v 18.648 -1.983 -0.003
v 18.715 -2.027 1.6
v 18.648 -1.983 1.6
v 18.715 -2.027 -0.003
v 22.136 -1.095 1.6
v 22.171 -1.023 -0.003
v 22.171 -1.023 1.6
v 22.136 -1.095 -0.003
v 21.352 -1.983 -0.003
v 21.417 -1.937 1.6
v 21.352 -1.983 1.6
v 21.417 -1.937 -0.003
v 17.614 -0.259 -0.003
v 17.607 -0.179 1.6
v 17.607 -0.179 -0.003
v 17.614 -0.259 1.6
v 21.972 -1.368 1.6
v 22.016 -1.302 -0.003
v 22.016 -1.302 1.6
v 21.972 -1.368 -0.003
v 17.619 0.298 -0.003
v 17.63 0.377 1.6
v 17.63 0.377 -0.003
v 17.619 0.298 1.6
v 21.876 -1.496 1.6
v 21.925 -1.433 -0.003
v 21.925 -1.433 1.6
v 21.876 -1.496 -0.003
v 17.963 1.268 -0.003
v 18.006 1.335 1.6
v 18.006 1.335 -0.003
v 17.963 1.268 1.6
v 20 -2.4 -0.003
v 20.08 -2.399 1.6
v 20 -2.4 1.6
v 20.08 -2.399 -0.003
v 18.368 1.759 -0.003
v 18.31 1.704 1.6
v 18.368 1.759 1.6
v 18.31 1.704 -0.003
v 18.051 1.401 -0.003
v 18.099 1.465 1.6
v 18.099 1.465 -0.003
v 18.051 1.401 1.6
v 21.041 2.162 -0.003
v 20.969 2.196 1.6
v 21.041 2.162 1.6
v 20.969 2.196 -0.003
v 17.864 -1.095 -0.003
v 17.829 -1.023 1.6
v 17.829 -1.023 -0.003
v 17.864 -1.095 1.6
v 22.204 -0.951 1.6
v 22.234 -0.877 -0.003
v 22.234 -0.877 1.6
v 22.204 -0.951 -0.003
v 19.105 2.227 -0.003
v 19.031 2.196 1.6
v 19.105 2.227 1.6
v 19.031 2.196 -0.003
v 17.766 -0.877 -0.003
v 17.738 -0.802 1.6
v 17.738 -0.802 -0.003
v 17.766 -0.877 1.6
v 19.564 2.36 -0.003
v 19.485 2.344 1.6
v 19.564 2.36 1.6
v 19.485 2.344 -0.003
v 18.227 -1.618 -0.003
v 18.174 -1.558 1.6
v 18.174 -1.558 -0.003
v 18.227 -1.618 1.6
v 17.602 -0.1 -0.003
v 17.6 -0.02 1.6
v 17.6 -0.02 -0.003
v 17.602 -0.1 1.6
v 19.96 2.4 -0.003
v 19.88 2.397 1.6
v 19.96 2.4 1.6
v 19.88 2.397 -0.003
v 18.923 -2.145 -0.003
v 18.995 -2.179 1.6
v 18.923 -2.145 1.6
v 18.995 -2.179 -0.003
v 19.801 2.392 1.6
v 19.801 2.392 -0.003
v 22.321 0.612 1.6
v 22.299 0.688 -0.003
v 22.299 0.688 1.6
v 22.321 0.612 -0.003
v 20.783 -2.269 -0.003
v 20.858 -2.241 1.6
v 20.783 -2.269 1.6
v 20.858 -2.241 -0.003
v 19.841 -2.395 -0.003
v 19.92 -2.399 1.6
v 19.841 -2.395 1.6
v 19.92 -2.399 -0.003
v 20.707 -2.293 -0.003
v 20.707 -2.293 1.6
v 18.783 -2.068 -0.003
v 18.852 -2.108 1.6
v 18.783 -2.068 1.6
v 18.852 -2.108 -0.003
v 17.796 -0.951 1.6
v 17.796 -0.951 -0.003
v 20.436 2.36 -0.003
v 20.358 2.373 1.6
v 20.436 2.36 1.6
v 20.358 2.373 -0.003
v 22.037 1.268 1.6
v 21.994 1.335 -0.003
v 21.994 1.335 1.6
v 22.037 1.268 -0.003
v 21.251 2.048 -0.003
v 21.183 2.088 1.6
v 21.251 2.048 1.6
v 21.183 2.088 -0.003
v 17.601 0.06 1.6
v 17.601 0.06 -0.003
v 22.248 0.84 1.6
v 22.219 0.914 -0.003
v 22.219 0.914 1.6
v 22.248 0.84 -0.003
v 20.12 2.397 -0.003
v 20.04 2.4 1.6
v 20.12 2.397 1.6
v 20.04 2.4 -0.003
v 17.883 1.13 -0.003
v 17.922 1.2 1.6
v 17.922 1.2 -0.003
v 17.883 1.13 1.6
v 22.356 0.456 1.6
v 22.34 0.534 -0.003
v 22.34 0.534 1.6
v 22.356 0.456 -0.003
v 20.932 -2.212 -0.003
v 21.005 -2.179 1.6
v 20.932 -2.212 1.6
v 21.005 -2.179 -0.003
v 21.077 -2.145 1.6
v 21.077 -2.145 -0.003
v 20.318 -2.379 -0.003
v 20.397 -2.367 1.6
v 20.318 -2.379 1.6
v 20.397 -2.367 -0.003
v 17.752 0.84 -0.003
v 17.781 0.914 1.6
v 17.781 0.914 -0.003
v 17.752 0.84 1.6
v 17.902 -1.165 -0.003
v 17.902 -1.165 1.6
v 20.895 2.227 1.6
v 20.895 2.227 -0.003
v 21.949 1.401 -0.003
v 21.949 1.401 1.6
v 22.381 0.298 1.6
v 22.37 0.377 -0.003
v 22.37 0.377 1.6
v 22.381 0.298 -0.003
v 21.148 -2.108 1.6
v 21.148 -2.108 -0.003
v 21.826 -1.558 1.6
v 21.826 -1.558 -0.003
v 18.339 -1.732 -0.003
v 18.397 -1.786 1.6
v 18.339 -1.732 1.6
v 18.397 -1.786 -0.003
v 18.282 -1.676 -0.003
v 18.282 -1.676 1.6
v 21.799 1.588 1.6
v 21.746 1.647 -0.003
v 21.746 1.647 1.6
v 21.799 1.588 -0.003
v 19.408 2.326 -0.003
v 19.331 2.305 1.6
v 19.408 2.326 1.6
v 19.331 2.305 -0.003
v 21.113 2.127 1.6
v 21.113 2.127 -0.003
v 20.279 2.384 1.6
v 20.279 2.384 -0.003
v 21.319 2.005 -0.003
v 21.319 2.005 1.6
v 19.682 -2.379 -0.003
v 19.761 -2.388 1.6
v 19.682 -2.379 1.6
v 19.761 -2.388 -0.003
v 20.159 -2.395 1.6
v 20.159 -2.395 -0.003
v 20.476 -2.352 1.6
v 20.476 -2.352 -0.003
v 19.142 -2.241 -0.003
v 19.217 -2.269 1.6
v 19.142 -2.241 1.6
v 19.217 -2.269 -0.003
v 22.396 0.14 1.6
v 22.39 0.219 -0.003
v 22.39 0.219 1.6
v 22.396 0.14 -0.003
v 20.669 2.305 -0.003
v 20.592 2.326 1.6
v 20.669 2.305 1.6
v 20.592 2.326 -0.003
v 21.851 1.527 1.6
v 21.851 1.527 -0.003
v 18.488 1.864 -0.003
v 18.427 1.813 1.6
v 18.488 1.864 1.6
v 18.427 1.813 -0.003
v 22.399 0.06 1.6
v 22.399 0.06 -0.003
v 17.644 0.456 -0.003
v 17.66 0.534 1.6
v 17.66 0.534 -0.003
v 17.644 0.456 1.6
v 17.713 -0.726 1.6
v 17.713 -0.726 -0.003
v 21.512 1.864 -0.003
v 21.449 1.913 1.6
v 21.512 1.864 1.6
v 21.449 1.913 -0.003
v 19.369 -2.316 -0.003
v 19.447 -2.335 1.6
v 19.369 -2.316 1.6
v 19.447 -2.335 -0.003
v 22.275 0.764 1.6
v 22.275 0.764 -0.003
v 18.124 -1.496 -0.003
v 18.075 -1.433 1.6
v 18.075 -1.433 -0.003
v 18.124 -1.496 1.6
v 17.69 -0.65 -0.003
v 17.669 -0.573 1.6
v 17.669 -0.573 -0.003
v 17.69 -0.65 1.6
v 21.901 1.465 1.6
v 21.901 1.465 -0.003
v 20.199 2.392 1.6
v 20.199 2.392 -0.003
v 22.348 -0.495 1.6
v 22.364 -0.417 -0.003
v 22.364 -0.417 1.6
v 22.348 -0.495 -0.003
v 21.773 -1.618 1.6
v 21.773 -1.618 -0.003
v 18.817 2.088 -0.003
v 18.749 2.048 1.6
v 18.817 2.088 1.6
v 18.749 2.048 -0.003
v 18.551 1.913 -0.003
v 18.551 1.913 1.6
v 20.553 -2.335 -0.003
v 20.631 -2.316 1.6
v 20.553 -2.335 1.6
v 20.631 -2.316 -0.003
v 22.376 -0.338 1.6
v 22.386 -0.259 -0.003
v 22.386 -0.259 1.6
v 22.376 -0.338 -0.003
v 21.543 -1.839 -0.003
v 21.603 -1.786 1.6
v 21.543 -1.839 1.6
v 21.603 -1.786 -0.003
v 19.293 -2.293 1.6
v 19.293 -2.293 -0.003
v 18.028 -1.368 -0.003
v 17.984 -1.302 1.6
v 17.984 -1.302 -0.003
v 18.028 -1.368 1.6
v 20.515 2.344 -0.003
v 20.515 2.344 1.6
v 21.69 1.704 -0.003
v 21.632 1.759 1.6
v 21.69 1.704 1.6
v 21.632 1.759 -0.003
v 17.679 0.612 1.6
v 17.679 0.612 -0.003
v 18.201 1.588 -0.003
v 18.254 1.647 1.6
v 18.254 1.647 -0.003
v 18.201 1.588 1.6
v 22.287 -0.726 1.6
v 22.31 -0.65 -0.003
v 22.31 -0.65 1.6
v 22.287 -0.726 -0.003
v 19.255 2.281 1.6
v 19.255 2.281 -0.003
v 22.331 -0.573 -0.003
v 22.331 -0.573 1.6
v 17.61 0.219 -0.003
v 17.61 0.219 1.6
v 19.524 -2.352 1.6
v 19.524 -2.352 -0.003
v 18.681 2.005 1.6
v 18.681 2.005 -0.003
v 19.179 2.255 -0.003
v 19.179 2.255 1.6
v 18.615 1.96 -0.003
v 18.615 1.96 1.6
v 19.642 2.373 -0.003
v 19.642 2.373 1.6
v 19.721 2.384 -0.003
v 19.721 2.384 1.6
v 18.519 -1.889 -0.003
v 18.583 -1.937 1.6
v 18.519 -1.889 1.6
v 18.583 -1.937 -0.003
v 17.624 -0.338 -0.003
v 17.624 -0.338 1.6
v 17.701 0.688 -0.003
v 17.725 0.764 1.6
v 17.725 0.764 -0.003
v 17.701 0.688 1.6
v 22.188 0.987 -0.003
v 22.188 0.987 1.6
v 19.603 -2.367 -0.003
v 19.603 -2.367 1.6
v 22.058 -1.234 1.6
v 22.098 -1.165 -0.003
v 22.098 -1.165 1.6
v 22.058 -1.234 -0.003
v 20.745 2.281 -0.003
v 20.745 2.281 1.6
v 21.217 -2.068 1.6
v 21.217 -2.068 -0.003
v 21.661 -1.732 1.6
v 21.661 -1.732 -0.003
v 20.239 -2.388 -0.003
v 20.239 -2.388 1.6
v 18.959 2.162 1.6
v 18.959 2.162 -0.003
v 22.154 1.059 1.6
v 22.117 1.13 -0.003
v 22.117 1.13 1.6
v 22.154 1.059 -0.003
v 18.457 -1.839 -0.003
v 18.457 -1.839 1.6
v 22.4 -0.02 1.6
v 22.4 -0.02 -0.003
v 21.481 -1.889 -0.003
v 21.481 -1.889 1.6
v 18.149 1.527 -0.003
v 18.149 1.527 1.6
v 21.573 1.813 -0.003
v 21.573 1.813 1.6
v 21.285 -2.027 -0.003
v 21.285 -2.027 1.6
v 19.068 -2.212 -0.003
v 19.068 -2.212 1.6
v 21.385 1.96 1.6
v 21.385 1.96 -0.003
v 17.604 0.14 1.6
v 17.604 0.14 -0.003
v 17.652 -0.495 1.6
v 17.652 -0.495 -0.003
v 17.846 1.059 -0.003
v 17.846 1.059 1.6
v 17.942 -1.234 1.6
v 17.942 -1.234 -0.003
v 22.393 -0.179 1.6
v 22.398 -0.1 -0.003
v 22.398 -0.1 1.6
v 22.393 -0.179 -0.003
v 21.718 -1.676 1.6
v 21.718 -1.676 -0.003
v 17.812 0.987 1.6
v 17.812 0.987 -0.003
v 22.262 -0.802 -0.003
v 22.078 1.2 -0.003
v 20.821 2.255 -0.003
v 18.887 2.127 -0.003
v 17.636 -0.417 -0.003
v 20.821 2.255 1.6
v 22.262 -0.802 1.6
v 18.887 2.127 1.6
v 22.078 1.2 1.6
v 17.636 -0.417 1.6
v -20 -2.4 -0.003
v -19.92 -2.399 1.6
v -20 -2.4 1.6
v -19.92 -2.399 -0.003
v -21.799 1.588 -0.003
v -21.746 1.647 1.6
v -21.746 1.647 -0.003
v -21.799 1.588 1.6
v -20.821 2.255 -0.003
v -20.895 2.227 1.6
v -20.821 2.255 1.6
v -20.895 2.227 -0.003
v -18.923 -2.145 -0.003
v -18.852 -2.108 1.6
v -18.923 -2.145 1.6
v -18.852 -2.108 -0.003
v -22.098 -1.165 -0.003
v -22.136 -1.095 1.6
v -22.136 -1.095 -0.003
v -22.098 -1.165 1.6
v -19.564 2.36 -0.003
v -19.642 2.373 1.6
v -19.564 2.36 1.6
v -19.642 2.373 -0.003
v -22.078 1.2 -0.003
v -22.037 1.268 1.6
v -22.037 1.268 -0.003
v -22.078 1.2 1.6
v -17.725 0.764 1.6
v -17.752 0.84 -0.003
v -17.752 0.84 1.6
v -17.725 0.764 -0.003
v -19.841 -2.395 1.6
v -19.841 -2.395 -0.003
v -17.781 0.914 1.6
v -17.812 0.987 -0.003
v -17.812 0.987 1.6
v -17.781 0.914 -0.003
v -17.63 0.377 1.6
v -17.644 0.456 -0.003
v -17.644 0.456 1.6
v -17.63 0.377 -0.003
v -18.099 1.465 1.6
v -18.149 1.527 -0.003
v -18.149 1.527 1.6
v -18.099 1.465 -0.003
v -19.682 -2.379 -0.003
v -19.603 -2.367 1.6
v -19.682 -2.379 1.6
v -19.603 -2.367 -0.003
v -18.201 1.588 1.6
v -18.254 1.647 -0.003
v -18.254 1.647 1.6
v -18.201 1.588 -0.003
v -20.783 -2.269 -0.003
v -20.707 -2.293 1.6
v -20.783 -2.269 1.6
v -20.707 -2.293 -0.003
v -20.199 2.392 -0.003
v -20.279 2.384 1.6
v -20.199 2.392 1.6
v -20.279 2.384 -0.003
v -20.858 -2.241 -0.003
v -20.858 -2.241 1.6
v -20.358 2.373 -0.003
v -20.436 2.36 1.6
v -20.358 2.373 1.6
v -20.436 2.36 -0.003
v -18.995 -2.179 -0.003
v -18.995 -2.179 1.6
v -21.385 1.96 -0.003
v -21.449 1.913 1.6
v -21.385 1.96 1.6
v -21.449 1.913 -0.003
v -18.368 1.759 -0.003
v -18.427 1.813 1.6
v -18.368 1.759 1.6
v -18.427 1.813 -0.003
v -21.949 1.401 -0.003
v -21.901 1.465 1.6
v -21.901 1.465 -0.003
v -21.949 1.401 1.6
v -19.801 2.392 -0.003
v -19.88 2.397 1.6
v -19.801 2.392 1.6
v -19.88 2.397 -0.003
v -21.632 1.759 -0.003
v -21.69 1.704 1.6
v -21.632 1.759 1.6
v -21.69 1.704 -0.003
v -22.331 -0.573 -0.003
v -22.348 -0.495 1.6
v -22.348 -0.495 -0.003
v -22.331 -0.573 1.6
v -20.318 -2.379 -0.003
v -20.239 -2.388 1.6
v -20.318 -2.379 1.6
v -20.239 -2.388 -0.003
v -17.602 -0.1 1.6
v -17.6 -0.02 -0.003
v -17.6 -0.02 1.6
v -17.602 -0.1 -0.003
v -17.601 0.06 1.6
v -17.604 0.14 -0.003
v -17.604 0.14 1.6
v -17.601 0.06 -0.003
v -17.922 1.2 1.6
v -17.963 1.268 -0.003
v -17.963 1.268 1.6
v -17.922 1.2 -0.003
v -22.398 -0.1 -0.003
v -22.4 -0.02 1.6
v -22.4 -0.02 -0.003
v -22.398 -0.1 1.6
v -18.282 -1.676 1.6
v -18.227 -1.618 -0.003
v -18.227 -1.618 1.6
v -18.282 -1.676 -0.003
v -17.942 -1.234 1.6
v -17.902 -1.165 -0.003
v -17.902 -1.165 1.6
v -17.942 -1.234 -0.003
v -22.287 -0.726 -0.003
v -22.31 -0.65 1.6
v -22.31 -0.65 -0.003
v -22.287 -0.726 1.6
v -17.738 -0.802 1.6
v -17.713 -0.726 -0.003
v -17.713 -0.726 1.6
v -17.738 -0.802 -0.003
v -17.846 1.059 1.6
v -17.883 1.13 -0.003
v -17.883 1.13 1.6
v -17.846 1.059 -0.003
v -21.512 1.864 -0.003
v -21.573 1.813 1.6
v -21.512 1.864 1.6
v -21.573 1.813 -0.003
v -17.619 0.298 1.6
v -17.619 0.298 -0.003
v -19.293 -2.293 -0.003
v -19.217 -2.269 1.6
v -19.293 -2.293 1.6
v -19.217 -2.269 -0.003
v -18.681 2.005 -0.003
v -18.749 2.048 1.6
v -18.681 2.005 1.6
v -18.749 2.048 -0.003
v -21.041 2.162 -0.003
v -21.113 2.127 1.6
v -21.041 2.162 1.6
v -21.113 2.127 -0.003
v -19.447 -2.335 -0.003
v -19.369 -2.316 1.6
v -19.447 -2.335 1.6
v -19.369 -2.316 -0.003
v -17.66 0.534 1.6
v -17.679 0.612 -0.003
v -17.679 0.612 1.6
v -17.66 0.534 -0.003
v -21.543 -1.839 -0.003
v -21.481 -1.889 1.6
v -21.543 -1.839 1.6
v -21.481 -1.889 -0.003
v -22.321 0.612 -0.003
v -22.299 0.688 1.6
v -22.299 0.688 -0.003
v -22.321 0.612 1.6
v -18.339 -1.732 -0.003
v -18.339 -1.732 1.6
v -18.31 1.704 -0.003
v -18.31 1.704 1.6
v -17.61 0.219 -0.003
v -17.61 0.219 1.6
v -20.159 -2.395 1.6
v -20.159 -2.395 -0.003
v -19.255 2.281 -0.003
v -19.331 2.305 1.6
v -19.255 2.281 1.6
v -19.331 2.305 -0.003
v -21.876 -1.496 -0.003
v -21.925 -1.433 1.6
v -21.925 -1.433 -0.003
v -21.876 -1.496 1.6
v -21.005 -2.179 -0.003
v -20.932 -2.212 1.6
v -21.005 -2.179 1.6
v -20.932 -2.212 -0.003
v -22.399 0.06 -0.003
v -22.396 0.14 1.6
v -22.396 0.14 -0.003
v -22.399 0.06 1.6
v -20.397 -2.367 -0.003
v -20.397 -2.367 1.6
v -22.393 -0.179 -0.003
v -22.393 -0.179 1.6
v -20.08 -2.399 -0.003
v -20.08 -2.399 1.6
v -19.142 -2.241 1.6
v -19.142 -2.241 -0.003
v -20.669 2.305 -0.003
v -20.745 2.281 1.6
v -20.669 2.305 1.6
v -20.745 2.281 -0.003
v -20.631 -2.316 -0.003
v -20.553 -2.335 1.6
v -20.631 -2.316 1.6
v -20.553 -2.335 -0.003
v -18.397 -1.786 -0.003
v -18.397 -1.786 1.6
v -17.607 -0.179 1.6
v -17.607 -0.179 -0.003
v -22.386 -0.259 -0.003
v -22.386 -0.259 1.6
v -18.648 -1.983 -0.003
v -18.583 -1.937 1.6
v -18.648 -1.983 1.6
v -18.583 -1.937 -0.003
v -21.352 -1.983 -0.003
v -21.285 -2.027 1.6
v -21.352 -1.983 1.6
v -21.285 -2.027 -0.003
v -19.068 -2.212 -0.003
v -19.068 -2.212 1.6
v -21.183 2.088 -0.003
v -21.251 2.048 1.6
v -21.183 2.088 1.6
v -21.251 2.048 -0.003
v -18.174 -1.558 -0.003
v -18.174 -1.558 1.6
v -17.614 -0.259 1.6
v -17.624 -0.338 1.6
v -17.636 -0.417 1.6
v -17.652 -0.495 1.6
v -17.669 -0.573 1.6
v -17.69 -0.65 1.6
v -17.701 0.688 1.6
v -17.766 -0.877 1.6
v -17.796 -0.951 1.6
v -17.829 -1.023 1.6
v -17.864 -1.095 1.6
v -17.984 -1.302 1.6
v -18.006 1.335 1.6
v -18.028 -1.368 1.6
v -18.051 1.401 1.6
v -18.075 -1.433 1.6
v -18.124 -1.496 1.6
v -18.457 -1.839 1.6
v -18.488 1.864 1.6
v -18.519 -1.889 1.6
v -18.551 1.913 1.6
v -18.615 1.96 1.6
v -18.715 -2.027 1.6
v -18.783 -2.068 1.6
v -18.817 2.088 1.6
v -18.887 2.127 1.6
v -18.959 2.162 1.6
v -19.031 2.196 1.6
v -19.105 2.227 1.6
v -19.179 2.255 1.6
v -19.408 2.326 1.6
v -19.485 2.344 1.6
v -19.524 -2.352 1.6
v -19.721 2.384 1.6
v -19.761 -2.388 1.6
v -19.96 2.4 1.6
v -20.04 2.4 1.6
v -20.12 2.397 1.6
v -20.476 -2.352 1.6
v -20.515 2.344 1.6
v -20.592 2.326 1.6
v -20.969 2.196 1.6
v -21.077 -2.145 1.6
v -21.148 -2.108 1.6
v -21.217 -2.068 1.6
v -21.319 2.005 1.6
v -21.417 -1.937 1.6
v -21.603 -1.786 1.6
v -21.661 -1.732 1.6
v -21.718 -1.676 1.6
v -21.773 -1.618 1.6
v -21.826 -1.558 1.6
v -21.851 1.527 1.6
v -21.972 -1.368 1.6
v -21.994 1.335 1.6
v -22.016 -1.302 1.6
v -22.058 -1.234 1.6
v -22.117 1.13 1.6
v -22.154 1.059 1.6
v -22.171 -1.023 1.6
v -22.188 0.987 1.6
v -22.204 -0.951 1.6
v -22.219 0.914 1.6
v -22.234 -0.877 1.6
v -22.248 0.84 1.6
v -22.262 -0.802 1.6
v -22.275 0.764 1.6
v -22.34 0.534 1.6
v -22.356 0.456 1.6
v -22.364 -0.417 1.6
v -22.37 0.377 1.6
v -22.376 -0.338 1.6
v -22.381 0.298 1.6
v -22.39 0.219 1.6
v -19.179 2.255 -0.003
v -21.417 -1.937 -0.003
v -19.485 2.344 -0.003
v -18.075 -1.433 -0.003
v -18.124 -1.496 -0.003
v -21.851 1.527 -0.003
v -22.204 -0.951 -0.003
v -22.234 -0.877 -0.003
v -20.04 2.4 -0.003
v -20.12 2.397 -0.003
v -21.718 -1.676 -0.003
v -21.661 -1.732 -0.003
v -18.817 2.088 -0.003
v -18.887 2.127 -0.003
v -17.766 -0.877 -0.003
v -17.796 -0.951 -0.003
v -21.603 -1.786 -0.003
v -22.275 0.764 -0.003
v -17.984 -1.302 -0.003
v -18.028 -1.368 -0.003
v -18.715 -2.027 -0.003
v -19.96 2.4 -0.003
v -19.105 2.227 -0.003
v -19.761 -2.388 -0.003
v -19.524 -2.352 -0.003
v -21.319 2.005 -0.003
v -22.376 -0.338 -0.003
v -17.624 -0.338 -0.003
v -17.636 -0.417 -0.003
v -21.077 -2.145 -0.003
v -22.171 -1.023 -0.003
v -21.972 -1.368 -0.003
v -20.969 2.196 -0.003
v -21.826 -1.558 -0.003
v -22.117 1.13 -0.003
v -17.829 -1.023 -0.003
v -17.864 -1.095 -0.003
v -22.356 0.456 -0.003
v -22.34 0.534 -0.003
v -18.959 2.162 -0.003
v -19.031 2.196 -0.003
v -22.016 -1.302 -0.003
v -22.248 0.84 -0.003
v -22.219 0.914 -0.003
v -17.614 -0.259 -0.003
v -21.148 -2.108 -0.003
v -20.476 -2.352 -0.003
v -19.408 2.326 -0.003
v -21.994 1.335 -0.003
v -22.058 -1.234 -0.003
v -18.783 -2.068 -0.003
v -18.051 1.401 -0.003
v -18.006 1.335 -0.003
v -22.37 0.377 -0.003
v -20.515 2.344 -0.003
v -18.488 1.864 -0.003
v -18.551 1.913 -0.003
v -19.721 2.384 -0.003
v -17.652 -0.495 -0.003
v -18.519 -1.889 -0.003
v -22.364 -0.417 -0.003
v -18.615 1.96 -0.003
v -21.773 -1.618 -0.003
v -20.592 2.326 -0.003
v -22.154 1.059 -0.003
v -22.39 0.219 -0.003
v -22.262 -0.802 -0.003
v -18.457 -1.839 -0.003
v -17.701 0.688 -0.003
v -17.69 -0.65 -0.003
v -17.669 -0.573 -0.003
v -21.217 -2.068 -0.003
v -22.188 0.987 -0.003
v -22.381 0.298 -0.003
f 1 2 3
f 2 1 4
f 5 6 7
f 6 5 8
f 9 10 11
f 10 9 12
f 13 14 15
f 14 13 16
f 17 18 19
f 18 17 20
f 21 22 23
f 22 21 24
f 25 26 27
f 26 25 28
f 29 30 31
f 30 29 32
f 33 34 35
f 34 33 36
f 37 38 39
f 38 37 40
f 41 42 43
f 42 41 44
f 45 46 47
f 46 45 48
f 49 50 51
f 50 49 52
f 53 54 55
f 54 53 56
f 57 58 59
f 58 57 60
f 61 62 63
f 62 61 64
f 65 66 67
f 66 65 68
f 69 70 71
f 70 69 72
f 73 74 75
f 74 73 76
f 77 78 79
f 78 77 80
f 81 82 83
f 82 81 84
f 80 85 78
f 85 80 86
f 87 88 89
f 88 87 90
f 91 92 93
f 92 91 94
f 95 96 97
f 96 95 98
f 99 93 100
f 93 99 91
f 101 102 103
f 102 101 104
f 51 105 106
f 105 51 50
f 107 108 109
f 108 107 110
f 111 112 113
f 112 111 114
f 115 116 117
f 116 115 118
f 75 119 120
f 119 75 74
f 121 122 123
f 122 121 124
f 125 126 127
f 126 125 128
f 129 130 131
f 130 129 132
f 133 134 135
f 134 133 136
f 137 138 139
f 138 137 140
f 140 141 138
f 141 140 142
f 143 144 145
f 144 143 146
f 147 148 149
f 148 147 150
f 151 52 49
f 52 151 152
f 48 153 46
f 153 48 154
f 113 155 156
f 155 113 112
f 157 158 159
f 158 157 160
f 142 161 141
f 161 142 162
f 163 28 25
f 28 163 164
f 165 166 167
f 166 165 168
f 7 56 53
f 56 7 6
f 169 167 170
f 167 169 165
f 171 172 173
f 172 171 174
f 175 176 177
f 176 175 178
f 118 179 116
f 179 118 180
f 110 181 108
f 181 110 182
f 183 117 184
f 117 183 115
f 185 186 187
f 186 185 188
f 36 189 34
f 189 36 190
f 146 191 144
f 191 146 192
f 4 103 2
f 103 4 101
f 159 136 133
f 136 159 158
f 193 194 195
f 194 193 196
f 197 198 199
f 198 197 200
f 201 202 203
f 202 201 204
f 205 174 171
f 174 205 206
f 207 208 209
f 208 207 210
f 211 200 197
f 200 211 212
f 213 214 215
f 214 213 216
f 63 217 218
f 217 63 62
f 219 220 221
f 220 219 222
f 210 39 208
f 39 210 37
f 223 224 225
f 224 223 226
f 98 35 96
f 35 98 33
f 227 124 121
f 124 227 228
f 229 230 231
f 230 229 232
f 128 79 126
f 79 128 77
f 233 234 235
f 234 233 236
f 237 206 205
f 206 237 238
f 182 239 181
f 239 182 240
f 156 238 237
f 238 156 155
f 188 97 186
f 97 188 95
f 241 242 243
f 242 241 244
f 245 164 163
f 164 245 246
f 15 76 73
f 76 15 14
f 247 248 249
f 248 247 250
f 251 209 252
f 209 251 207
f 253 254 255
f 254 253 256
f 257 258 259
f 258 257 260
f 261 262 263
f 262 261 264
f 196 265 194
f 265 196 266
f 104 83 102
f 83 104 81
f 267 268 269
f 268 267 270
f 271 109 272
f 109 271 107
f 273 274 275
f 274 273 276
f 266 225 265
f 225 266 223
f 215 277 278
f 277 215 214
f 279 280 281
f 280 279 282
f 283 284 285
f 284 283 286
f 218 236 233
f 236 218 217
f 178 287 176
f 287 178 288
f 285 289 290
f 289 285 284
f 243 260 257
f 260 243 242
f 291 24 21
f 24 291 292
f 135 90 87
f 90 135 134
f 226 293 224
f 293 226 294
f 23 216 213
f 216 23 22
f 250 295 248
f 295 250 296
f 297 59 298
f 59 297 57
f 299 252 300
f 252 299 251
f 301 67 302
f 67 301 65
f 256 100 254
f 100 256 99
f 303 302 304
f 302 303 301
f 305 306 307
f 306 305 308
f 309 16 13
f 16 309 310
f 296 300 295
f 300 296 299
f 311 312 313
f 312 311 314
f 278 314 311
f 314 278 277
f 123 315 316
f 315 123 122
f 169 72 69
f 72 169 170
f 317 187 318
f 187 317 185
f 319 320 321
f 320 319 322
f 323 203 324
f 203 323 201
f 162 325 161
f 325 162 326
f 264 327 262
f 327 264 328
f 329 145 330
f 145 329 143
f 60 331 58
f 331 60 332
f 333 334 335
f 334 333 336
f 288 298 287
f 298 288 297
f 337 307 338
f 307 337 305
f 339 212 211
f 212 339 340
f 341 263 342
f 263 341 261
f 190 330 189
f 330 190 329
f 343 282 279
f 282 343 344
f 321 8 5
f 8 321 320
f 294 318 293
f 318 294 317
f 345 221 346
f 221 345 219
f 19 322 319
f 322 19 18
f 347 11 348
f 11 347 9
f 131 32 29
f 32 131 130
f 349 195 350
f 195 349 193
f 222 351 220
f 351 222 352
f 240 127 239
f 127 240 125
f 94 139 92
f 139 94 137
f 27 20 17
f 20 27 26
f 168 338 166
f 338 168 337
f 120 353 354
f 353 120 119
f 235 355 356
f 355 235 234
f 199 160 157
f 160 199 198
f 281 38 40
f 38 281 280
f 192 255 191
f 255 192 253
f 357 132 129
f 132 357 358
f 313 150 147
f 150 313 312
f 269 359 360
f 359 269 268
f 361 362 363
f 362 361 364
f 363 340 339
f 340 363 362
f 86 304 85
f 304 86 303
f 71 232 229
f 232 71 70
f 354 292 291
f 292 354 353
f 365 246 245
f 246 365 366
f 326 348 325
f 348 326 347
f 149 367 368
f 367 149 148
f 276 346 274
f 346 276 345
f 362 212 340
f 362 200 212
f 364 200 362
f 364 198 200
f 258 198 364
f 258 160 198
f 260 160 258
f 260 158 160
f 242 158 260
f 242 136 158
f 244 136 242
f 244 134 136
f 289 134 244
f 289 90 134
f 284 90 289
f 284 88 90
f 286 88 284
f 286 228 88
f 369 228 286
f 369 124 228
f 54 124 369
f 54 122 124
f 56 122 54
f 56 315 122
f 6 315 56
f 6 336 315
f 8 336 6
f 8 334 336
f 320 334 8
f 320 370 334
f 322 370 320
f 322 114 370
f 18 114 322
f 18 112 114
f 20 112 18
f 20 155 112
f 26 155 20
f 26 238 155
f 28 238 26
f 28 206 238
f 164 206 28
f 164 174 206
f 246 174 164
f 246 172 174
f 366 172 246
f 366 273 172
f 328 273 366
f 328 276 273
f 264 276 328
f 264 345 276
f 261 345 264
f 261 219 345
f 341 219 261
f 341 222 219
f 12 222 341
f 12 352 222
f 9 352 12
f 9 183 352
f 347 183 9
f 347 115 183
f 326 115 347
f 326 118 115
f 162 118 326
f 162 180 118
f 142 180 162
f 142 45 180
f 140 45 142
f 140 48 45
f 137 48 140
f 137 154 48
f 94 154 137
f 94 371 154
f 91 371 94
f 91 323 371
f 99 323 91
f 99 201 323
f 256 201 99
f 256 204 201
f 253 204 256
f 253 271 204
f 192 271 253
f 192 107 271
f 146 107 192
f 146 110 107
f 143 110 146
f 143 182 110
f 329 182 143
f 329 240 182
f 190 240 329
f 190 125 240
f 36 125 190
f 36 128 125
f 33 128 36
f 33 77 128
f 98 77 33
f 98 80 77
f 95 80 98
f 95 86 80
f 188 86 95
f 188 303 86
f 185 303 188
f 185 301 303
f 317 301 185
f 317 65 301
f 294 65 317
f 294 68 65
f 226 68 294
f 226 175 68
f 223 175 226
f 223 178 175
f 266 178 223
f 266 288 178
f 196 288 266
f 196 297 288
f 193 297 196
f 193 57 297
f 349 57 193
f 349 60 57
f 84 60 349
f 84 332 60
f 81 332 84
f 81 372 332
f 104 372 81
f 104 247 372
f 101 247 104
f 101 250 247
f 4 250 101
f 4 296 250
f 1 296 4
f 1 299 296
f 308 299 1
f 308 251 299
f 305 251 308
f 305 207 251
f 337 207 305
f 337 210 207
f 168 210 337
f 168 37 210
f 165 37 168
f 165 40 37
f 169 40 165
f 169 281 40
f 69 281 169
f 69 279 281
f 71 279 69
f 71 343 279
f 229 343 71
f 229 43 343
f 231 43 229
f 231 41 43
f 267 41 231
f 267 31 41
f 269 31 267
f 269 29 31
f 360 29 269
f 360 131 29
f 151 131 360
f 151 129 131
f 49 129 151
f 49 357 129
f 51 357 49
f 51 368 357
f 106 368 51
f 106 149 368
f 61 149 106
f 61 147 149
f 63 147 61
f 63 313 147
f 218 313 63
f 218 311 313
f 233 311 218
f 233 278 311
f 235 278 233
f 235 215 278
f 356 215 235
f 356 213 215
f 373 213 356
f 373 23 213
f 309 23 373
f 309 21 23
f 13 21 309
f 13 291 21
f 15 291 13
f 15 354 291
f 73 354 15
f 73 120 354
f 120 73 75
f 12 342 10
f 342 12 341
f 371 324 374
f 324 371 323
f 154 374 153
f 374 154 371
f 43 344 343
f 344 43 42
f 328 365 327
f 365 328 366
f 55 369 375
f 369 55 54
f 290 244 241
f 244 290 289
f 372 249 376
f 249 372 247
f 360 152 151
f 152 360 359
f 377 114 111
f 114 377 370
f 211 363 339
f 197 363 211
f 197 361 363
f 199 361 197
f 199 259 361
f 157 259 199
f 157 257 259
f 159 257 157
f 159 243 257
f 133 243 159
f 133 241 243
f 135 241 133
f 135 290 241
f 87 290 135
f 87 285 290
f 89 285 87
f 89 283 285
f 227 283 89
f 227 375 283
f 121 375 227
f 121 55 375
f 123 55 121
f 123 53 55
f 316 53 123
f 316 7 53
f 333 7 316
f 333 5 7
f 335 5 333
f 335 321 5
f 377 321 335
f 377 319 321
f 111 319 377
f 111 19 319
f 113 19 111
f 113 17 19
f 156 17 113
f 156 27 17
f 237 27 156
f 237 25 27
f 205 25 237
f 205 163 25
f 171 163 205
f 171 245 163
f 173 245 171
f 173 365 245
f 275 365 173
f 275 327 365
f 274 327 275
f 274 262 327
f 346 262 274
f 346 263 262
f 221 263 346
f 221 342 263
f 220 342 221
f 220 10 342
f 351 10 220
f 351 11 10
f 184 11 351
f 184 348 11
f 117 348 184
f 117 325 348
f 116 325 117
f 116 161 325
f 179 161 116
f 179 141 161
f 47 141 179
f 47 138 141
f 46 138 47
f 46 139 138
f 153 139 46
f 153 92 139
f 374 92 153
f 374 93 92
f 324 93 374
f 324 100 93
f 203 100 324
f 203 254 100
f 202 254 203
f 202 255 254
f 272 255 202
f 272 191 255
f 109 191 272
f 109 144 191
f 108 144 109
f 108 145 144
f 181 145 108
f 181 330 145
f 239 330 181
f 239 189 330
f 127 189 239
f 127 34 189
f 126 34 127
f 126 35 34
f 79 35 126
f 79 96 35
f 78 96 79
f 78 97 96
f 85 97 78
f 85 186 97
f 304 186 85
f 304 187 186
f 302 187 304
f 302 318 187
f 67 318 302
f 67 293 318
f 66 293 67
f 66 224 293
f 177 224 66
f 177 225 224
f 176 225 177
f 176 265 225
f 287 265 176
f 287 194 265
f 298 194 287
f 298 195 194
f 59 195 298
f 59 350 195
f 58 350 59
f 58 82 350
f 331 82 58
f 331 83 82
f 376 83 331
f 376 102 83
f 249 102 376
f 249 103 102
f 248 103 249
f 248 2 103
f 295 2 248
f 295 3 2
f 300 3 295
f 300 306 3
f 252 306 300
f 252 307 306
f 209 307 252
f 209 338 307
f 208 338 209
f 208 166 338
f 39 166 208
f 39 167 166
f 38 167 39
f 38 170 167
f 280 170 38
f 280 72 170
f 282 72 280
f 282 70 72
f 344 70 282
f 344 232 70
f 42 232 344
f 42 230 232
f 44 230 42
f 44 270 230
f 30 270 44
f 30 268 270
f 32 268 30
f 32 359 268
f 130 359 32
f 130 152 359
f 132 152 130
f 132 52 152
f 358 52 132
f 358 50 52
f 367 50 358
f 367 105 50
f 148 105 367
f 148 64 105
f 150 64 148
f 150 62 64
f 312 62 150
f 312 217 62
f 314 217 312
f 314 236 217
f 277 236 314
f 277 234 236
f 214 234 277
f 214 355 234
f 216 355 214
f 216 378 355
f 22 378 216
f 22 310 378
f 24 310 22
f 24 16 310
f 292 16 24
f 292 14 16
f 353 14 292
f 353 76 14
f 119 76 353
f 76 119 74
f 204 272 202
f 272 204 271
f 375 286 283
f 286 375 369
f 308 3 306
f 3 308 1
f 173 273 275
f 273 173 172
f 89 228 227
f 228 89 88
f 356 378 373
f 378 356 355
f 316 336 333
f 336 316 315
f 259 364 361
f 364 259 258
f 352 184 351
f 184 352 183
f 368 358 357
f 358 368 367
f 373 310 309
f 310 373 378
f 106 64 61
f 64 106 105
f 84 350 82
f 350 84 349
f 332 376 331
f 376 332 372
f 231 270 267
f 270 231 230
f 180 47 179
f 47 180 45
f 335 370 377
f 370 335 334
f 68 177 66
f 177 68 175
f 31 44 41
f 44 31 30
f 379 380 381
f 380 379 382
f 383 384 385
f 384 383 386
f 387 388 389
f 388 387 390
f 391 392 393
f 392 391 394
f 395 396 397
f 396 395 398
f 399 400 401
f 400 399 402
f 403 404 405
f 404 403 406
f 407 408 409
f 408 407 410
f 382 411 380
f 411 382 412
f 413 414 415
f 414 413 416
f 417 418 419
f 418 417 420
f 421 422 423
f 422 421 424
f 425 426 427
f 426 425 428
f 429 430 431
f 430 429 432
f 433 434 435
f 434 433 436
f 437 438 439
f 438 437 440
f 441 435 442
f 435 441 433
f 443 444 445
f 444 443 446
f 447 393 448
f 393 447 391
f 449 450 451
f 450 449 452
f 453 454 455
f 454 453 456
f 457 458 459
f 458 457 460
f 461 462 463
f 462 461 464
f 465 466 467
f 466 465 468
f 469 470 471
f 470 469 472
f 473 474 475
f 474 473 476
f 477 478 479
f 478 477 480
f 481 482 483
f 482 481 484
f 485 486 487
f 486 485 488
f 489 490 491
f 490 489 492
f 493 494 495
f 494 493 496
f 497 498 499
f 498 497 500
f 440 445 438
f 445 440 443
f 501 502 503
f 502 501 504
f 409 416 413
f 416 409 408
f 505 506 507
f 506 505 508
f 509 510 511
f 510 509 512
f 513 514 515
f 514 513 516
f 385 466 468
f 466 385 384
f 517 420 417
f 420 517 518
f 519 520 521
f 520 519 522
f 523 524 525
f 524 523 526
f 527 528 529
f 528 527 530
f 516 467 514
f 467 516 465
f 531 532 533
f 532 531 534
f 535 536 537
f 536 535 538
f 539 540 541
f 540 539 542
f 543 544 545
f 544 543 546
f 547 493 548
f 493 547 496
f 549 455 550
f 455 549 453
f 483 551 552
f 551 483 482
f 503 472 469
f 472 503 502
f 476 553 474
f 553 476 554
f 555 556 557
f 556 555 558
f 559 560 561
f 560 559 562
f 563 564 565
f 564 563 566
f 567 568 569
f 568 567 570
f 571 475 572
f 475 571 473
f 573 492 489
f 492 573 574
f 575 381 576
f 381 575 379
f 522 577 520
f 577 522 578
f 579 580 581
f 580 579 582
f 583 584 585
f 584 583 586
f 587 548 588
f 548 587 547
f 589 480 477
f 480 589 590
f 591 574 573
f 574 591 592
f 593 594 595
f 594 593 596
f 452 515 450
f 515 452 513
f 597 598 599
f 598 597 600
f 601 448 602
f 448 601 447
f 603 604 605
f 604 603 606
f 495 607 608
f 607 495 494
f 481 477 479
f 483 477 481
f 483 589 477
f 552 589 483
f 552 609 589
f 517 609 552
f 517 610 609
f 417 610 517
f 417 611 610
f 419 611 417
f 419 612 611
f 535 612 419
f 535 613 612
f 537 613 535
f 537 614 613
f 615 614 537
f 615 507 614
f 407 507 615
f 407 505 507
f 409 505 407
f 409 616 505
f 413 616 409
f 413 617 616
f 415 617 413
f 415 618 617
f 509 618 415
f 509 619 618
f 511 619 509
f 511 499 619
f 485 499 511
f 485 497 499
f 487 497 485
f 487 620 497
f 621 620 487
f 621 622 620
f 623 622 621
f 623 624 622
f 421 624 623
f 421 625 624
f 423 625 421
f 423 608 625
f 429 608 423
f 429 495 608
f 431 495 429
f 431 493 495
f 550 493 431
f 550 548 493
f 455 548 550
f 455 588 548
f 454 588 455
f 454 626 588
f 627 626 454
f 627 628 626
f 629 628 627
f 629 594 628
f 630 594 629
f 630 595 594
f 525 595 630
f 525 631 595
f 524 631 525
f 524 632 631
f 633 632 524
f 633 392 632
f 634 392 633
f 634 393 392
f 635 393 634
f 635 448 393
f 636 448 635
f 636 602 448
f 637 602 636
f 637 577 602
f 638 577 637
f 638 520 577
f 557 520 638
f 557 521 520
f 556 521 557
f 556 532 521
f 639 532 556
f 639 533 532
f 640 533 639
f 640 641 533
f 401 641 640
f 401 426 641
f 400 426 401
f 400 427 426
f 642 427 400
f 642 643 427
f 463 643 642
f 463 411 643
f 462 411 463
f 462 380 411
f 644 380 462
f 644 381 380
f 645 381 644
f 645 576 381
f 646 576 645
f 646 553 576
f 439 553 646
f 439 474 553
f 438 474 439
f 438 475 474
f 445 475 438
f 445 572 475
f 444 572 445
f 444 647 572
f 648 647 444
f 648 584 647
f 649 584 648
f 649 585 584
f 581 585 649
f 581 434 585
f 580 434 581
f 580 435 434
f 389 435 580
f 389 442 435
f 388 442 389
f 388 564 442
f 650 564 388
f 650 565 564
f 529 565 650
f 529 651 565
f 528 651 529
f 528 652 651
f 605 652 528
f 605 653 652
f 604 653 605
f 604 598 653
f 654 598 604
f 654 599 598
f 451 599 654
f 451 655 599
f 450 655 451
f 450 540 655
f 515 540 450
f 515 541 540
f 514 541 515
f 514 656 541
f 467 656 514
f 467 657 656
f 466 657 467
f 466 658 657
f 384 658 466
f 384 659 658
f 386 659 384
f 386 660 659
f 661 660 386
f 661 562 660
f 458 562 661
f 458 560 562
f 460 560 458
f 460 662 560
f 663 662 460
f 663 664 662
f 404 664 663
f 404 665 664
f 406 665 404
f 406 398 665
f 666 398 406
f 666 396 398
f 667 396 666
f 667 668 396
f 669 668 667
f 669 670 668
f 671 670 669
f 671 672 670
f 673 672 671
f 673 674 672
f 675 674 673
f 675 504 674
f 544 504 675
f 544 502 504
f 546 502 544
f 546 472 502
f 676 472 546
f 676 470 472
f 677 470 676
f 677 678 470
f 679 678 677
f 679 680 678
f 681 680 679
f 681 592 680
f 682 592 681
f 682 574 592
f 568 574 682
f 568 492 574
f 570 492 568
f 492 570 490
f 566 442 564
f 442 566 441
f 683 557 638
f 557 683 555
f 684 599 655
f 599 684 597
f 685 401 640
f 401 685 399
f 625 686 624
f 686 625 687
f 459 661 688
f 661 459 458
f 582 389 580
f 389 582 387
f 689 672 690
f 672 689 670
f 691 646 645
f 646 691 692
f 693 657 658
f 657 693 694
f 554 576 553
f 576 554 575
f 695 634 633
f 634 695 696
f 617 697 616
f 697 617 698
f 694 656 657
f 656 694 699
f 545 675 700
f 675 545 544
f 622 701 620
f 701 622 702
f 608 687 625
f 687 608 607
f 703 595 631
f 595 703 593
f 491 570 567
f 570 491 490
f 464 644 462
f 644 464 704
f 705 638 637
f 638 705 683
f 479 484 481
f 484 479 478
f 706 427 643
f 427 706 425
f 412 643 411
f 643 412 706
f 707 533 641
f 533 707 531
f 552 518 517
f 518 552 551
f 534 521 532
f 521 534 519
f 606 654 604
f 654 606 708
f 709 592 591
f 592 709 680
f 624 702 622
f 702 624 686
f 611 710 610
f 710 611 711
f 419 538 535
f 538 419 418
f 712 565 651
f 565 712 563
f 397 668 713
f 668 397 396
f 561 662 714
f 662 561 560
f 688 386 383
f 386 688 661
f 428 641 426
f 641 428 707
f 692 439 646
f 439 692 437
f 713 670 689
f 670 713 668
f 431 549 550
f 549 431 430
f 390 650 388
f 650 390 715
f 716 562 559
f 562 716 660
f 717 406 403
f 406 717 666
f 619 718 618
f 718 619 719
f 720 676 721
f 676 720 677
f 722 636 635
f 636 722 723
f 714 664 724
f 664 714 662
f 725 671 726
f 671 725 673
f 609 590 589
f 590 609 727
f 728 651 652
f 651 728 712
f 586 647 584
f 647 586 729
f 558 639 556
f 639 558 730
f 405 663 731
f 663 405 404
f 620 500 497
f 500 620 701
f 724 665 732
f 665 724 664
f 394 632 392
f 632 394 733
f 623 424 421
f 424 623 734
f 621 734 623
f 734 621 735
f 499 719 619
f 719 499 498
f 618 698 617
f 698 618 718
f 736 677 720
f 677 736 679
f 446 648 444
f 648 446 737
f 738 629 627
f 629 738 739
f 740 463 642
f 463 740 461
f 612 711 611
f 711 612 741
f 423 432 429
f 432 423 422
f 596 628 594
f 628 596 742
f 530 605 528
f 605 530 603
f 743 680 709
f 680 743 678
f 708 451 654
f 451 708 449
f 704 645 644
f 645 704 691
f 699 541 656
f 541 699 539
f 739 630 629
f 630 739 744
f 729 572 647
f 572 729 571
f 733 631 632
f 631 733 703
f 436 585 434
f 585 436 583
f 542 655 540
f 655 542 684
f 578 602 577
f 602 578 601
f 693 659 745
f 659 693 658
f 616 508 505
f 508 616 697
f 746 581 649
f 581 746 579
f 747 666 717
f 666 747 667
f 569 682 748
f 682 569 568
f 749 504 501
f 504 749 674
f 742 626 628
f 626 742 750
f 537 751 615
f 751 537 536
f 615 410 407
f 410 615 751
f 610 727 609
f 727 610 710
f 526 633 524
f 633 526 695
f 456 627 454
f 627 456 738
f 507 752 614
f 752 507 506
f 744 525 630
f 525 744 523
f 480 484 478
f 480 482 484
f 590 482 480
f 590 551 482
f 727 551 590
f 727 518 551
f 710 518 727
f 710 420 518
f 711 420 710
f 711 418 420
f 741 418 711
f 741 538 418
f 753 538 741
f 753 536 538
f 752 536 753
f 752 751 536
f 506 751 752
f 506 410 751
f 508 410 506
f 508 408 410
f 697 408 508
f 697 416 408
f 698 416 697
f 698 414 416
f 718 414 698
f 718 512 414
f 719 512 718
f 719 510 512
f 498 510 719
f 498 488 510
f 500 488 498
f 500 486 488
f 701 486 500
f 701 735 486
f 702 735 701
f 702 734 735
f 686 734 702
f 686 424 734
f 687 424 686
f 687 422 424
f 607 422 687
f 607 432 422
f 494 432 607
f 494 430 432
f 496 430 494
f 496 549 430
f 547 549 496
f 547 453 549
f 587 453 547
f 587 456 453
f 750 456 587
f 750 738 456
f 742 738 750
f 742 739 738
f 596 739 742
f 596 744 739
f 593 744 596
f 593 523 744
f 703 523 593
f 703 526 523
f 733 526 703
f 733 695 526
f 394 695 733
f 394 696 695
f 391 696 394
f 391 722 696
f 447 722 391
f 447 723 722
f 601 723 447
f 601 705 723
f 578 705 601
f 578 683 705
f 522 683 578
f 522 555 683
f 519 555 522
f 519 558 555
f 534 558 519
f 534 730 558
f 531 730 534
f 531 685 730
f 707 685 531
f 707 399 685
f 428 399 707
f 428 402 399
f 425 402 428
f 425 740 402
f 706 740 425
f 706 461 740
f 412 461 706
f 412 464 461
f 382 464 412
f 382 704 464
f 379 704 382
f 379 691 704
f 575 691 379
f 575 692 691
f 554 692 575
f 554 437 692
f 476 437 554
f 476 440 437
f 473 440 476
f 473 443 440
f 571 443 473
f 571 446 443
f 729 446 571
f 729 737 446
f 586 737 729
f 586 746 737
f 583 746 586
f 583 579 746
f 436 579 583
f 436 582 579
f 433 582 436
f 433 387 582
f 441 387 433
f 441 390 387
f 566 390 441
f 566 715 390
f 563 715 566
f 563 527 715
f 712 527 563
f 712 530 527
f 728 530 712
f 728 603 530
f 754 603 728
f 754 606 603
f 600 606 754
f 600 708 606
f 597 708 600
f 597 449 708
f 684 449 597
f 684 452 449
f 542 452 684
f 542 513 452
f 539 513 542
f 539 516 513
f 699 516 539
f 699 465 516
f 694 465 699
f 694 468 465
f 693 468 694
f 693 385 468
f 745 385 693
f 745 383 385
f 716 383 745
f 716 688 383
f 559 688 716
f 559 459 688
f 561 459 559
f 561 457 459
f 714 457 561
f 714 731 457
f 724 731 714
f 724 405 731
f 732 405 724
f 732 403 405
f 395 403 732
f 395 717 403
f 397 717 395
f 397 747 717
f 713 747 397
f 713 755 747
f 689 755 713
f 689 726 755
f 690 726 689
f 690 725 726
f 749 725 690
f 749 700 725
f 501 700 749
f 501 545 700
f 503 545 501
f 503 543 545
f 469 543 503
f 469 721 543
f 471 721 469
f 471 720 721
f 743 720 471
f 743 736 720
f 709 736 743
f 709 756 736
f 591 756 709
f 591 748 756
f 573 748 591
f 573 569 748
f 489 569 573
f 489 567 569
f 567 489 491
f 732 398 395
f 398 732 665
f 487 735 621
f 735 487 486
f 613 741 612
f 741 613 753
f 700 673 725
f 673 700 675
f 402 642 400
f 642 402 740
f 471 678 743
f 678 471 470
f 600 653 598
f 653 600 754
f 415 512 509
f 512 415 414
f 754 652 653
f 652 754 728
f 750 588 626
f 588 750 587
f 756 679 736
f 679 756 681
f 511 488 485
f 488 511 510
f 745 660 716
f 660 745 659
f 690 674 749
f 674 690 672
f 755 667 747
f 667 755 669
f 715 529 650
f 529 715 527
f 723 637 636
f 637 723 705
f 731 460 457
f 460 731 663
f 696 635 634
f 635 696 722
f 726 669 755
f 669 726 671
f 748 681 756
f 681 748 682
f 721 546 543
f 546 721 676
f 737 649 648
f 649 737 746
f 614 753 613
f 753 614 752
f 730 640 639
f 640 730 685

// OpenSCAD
use <../lib.scad>
use <3939.scad>
$fa=1; $fs=0.2;
function ldraw_lib__3951(realsolid=false) = [
// 0 ~Moved to 3939
// 0 Name: 3951.dat
// 0 Author: [PTadmin]
// 0 !LDRAW_ORG Part UPDATE 1999-03
// 0 !LICENSE Licensed under CC BY 4.0 : see CAreadme.txt
// 
// 0 BFC CERTIFY CCW
  [0,"BFC","CERTIFY"],
  [0,"BFC","CCW"],
// 
// 0 !HISTORY 1999-05-17 [PTadmin] Official Update 1999-03
// 0 !HISTORY 2007-06-30 [PTadmin] Header formatted for Contributor Agreement
// 0 !HISTORY 2008-07-01 [PTadmin] Official Update 2008-01
// 
// 
// 1 16 0 0 0 1 0 0 0 1 0 0 0 1 3939.dat
  [1,16,0,0,0,1,0,0,0,1,0,0,0,1, ldraw_lib__3939(realsolid)],
];
module ldraw_lib__3951(step=0, col=false, unit=2/5, alt=false, line=0.2, solid=!$preview)
    makepoly(ldraw_lib__3951(solid), step=step, col=col, unit=unit, alt=alt, line=line, solid=solid);
ldraw_lib__3951(line=0.2);
